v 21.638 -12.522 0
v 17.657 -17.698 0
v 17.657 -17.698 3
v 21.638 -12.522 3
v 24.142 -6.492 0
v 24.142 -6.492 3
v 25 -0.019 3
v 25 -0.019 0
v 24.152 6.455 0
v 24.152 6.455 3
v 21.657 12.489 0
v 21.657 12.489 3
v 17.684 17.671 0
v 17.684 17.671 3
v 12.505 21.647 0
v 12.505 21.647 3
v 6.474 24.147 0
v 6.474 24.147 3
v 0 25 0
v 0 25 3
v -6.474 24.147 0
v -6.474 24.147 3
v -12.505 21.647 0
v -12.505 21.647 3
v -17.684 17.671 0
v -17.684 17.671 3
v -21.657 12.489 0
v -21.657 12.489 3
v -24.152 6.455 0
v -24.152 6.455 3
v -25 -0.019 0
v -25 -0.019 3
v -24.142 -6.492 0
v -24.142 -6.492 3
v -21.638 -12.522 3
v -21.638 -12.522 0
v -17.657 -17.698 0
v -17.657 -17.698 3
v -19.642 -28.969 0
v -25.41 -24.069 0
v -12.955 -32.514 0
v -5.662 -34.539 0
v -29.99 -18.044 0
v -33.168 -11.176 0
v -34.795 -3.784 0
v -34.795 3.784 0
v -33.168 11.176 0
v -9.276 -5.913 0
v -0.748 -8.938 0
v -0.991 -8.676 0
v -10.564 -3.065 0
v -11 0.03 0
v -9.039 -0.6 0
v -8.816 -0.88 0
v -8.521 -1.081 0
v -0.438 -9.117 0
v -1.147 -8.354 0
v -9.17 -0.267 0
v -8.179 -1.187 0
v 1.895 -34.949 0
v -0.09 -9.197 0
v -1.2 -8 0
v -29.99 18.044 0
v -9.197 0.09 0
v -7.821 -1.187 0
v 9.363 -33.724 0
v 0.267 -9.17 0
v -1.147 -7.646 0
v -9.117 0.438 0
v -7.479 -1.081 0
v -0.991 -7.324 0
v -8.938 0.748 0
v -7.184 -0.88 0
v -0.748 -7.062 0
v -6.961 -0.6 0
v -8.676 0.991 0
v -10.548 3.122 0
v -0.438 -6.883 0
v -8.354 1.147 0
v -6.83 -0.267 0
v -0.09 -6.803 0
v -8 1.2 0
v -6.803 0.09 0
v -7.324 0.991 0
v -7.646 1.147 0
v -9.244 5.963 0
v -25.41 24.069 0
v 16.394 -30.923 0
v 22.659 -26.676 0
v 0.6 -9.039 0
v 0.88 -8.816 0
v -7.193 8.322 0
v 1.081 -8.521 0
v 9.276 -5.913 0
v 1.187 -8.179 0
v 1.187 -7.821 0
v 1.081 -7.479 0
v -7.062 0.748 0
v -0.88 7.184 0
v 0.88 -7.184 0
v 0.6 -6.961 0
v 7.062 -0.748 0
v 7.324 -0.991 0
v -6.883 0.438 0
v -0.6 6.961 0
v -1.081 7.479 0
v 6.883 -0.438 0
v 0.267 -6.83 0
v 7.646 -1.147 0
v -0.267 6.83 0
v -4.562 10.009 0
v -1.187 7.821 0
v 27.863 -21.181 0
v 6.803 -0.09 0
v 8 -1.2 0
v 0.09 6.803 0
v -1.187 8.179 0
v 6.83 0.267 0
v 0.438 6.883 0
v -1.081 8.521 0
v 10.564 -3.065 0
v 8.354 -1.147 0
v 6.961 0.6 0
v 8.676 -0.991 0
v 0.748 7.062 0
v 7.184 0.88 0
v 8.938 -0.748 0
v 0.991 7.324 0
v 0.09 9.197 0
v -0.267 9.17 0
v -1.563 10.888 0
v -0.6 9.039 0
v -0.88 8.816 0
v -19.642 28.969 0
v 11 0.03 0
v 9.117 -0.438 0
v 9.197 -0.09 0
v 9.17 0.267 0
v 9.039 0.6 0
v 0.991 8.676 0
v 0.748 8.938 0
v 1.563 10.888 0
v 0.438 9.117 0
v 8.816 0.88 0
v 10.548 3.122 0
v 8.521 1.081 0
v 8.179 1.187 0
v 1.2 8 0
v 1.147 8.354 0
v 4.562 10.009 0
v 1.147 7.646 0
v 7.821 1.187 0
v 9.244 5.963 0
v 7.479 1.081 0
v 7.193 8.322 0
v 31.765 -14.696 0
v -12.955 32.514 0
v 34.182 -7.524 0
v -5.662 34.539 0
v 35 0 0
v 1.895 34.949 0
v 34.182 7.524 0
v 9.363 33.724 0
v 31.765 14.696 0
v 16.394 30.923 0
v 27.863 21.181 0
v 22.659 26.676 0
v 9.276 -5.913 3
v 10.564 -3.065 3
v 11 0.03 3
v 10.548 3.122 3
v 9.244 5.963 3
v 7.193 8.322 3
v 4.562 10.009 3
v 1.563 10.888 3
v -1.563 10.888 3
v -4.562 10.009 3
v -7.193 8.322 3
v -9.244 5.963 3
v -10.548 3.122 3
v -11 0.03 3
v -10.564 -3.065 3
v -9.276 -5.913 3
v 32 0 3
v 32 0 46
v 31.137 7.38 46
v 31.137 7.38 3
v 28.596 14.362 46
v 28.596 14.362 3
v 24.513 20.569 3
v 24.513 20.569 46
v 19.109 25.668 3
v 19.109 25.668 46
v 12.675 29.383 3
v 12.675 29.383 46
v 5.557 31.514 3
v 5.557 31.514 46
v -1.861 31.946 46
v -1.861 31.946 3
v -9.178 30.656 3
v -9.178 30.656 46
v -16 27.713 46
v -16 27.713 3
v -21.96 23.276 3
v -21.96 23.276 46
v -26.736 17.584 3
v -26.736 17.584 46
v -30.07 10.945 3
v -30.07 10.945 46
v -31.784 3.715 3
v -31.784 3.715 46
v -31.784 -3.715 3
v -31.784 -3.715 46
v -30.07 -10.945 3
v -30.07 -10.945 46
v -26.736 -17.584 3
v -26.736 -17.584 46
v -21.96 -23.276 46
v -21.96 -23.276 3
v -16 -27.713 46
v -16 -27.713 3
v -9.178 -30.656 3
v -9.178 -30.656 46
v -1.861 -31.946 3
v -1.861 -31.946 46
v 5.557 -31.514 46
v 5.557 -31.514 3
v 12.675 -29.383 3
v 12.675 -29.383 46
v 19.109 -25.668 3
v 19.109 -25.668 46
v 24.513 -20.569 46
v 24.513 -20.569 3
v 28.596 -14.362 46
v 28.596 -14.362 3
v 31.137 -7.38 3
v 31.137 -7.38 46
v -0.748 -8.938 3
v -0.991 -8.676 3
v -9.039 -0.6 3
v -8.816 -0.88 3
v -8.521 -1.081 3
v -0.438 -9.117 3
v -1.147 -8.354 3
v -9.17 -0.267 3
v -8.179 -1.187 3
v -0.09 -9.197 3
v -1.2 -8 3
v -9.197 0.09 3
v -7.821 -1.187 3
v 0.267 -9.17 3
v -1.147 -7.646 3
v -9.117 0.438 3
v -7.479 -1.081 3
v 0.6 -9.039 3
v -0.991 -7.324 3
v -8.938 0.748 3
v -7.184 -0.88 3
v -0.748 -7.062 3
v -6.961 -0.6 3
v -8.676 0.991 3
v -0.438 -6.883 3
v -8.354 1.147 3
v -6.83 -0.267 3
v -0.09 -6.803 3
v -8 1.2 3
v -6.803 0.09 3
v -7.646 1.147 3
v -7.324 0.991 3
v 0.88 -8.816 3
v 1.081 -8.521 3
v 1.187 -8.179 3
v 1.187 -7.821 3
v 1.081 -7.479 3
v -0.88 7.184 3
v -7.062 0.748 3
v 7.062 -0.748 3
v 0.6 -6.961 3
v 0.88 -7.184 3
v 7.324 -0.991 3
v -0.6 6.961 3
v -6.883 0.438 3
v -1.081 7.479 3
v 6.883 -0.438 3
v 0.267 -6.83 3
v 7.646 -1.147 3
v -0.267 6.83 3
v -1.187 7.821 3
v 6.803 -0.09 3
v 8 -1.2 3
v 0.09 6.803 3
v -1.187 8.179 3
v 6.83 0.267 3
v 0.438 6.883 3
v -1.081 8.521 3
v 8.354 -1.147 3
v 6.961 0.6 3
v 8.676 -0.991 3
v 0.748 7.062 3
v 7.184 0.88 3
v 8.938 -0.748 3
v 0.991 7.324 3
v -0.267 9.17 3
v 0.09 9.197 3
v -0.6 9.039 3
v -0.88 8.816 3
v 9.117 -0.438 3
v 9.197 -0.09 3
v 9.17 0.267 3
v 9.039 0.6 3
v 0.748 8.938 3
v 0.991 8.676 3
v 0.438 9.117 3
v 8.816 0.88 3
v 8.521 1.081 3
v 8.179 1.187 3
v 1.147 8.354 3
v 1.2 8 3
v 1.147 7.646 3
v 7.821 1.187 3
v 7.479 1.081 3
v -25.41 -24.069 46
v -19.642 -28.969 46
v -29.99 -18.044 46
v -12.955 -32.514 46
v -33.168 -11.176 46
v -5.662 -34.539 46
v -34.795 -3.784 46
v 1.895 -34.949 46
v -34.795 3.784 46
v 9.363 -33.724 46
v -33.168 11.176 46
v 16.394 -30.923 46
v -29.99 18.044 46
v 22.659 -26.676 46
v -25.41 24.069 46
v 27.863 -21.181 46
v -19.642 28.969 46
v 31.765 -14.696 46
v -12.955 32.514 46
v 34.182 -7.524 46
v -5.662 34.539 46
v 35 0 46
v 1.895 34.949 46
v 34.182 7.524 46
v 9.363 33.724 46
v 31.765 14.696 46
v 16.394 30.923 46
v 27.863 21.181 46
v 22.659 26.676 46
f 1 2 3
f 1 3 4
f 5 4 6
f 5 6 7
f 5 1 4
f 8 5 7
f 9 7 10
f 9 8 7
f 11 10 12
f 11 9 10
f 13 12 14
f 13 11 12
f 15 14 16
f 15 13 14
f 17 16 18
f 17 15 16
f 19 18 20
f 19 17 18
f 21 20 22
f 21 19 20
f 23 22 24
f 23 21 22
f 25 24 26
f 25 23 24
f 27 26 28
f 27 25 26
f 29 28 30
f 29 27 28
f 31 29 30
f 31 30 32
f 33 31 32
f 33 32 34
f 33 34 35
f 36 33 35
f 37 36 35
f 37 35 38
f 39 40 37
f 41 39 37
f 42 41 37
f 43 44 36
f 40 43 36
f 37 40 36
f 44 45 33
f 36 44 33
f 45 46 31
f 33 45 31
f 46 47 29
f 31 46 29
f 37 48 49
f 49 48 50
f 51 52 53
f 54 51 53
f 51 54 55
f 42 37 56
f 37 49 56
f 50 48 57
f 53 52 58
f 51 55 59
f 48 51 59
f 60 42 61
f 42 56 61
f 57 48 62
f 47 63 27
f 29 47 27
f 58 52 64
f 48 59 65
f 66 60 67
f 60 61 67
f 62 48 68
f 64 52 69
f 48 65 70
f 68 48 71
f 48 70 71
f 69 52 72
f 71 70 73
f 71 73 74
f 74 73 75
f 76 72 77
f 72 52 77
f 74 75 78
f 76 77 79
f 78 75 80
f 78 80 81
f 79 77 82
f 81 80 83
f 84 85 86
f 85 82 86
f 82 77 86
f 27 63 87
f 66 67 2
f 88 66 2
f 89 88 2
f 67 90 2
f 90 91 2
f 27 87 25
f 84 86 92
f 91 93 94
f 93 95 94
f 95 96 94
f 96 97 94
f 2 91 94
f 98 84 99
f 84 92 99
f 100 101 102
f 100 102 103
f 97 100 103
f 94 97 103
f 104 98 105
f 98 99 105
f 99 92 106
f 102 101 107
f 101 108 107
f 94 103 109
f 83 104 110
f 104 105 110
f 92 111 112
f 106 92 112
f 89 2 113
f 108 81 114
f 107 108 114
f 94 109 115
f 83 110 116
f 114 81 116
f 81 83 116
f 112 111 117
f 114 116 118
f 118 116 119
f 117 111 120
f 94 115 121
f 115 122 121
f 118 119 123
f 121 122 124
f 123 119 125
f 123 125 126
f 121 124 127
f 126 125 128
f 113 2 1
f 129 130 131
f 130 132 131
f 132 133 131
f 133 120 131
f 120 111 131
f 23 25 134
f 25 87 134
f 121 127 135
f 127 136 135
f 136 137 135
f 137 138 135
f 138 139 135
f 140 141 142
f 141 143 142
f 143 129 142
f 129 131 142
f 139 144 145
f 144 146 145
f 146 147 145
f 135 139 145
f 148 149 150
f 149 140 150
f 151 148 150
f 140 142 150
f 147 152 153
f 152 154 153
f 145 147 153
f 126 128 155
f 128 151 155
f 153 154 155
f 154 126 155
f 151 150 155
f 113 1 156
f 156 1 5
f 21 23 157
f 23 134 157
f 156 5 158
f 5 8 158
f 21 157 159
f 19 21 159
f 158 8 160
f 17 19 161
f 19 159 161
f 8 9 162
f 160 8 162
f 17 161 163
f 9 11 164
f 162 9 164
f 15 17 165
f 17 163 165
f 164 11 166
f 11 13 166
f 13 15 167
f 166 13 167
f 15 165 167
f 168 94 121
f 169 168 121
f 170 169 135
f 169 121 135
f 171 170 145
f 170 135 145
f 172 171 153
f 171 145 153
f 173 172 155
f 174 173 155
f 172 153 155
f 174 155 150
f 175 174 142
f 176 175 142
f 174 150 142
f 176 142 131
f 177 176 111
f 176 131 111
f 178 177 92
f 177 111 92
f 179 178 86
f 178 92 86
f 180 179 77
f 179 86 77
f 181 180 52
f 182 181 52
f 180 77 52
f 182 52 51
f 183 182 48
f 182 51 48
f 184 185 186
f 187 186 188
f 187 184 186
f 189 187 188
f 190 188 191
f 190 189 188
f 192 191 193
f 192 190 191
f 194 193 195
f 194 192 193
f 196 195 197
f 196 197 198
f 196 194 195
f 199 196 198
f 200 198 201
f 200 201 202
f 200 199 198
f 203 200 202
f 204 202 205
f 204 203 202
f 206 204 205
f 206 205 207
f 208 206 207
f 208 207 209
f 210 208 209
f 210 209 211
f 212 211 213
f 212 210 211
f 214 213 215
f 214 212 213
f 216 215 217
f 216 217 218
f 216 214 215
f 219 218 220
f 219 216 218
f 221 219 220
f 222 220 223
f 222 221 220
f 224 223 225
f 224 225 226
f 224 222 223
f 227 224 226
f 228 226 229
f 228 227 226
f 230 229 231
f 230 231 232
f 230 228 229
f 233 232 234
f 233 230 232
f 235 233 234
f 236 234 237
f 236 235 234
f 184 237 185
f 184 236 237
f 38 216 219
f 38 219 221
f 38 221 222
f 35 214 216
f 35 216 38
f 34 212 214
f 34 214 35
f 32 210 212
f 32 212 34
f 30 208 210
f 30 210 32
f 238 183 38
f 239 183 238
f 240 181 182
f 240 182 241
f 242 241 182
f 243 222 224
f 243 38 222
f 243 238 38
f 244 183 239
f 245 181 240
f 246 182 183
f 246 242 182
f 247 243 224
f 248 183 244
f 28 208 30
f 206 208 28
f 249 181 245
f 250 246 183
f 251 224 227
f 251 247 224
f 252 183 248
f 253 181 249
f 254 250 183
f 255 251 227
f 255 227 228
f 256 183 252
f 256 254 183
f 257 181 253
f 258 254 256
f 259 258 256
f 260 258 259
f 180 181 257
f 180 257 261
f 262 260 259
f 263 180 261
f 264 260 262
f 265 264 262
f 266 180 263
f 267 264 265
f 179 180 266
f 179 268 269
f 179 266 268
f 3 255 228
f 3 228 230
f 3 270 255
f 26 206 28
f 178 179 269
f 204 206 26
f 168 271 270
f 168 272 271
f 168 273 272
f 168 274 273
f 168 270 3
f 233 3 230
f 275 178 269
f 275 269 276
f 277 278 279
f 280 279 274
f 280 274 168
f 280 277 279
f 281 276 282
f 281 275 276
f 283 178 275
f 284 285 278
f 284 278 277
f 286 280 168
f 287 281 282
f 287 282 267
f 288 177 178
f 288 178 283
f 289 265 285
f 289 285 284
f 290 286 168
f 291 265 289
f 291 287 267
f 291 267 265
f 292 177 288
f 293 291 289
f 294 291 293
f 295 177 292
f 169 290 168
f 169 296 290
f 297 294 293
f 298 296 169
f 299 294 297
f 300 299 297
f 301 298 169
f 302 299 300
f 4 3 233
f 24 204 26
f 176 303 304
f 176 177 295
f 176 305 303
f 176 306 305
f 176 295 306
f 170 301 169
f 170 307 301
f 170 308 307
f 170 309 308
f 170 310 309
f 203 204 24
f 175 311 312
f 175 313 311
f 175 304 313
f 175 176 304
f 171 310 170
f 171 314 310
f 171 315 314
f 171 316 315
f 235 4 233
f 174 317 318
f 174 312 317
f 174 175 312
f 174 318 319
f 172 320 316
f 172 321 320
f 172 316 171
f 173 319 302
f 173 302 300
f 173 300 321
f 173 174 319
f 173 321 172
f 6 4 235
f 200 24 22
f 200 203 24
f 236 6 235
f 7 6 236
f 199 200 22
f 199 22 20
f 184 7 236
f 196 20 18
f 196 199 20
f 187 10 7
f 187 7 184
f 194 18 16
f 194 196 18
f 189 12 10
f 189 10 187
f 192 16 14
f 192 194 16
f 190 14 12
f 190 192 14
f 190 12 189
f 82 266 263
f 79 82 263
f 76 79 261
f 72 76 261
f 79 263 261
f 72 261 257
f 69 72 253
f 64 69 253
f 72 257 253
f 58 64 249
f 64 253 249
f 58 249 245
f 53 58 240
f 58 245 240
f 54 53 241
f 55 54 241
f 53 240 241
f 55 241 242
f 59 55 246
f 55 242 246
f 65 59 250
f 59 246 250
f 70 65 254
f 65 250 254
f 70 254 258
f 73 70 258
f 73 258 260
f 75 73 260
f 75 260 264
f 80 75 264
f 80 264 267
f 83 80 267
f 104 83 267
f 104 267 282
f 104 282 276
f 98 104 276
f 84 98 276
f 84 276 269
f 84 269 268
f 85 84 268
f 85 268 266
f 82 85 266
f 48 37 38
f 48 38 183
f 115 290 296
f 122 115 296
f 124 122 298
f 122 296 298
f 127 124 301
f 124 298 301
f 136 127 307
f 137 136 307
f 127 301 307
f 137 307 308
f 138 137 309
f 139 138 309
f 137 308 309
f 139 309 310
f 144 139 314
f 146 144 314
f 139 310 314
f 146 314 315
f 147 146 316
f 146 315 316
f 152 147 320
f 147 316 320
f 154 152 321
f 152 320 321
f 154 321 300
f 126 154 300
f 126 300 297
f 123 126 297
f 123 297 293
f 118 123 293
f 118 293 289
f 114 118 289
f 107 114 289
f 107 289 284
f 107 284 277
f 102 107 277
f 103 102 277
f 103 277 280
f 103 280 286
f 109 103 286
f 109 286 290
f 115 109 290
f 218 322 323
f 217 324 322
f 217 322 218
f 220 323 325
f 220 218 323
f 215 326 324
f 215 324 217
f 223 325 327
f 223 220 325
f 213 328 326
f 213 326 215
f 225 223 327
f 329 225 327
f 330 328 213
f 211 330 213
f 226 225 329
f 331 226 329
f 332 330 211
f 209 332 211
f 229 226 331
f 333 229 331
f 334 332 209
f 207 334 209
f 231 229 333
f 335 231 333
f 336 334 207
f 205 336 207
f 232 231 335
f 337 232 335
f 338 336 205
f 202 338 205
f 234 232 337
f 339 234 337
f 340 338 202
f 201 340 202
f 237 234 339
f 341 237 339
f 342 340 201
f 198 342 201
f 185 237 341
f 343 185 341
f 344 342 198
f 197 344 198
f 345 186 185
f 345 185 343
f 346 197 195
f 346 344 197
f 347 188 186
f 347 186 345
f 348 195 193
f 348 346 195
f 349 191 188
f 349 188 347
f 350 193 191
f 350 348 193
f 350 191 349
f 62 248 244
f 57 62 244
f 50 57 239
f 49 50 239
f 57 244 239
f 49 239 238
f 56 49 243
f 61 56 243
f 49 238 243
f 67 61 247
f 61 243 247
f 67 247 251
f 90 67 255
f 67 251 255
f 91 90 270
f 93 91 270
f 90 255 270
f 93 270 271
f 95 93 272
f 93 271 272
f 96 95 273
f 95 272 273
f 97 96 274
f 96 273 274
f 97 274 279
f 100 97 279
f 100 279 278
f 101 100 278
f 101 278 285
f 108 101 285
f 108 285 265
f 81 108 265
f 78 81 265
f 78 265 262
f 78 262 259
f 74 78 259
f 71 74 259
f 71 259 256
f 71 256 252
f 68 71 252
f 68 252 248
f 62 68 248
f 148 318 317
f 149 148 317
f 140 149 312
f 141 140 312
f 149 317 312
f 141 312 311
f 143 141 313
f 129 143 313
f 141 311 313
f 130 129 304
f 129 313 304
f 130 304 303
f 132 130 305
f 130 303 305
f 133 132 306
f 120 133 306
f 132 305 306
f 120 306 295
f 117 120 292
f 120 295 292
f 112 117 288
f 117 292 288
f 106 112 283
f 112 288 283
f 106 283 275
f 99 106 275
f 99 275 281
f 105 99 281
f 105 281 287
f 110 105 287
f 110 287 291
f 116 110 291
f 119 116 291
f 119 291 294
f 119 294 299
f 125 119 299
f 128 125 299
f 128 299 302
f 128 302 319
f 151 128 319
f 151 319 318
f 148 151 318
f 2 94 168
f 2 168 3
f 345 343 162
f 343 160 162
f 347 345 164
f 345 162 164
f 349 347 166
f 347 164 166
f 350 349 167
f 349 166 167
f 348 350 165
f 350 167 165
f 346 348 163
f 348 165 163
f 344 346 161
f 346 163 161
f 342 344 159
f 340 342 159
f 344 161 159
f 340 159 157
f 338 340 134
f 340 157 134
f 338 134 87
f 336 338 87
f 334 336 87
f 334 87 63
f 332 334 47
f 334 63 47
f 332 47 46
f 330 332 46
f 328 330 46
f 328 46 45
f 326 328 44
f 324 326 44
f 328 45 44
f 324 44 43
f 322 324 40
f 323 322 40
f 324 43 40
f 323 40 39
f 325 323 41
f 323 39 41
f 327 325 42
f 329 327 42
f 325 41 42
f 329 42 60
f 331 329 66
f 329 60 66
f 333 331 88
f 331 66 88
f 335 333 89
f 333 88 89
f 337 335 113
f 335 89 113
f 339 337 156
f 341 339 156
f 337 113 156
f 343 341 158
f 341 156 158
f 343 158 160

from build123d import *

# Parameters (mm, degrees)
SKETCH_R           = 35
PAD_DEPTH          = 3
SKETCH001_R        = 1.2
HOLE_DEPTH         = 201.081792
POLARPATTERN_COUNT = 4
SKETCH002_R        = 35
SKETCH002_R_2      = 32
PAD001_DEPTH       = 43


with BuildPart() as part:
    # Sketch → Pad (new body)
    with BuildSketch(Plane.XY):
        Circle(SKETCH_R)
        with BuildLine():
            ThreePointArc((9.27573, -5.912769), (0, 11), (-9.27573, -5.912769))
            Line((-17.657478, -17.697838), (-9.27573, -5.912769))
            ThreePointArc((17.657478, -17.697838), (0, 25), (-17.657478, -17.697838))
            Line((9.27573, -5.912769), (17.657478, -17.697838))
        make_face(mode=Mode.SUBTRACT)
    extrude(amount=PAD_DEPTH)

    # Sketch001 (on Face7 of Pad) → Hole (cut, through all)
    with BuildSketch(Plane.XY.offset(3)):
        with Locations((0, 8)):
            Circle(SKETCH001_R)
    hole = extrude(amount=-HOLE_DEPTH, mode=Mode.SUBTRACT)

    # PolarPattern: Hole ×4 about axis
    polarpattern_axis = Axis((0, 0, 0), (0, 0, 1))
    for i in range(1, POLARPATTERN_COUNT):
        add(hole.rotate(polarpattern_axis, i * 360 / POLARPATTERN_COUNT), mode=Mode.SUBTRACT)

    # Sketch002 (on Face3 of PolarPattern) → Pad001 (join)
    with BuildSketch(Plane.XY.offset(3)):
        Circle(SKETCH002_R)
        Circle(SKETCH002_R_2, mode=Mode.SUBTRACT)
    extrude(amount=PAD001_DEPTH)


solid = part.part
